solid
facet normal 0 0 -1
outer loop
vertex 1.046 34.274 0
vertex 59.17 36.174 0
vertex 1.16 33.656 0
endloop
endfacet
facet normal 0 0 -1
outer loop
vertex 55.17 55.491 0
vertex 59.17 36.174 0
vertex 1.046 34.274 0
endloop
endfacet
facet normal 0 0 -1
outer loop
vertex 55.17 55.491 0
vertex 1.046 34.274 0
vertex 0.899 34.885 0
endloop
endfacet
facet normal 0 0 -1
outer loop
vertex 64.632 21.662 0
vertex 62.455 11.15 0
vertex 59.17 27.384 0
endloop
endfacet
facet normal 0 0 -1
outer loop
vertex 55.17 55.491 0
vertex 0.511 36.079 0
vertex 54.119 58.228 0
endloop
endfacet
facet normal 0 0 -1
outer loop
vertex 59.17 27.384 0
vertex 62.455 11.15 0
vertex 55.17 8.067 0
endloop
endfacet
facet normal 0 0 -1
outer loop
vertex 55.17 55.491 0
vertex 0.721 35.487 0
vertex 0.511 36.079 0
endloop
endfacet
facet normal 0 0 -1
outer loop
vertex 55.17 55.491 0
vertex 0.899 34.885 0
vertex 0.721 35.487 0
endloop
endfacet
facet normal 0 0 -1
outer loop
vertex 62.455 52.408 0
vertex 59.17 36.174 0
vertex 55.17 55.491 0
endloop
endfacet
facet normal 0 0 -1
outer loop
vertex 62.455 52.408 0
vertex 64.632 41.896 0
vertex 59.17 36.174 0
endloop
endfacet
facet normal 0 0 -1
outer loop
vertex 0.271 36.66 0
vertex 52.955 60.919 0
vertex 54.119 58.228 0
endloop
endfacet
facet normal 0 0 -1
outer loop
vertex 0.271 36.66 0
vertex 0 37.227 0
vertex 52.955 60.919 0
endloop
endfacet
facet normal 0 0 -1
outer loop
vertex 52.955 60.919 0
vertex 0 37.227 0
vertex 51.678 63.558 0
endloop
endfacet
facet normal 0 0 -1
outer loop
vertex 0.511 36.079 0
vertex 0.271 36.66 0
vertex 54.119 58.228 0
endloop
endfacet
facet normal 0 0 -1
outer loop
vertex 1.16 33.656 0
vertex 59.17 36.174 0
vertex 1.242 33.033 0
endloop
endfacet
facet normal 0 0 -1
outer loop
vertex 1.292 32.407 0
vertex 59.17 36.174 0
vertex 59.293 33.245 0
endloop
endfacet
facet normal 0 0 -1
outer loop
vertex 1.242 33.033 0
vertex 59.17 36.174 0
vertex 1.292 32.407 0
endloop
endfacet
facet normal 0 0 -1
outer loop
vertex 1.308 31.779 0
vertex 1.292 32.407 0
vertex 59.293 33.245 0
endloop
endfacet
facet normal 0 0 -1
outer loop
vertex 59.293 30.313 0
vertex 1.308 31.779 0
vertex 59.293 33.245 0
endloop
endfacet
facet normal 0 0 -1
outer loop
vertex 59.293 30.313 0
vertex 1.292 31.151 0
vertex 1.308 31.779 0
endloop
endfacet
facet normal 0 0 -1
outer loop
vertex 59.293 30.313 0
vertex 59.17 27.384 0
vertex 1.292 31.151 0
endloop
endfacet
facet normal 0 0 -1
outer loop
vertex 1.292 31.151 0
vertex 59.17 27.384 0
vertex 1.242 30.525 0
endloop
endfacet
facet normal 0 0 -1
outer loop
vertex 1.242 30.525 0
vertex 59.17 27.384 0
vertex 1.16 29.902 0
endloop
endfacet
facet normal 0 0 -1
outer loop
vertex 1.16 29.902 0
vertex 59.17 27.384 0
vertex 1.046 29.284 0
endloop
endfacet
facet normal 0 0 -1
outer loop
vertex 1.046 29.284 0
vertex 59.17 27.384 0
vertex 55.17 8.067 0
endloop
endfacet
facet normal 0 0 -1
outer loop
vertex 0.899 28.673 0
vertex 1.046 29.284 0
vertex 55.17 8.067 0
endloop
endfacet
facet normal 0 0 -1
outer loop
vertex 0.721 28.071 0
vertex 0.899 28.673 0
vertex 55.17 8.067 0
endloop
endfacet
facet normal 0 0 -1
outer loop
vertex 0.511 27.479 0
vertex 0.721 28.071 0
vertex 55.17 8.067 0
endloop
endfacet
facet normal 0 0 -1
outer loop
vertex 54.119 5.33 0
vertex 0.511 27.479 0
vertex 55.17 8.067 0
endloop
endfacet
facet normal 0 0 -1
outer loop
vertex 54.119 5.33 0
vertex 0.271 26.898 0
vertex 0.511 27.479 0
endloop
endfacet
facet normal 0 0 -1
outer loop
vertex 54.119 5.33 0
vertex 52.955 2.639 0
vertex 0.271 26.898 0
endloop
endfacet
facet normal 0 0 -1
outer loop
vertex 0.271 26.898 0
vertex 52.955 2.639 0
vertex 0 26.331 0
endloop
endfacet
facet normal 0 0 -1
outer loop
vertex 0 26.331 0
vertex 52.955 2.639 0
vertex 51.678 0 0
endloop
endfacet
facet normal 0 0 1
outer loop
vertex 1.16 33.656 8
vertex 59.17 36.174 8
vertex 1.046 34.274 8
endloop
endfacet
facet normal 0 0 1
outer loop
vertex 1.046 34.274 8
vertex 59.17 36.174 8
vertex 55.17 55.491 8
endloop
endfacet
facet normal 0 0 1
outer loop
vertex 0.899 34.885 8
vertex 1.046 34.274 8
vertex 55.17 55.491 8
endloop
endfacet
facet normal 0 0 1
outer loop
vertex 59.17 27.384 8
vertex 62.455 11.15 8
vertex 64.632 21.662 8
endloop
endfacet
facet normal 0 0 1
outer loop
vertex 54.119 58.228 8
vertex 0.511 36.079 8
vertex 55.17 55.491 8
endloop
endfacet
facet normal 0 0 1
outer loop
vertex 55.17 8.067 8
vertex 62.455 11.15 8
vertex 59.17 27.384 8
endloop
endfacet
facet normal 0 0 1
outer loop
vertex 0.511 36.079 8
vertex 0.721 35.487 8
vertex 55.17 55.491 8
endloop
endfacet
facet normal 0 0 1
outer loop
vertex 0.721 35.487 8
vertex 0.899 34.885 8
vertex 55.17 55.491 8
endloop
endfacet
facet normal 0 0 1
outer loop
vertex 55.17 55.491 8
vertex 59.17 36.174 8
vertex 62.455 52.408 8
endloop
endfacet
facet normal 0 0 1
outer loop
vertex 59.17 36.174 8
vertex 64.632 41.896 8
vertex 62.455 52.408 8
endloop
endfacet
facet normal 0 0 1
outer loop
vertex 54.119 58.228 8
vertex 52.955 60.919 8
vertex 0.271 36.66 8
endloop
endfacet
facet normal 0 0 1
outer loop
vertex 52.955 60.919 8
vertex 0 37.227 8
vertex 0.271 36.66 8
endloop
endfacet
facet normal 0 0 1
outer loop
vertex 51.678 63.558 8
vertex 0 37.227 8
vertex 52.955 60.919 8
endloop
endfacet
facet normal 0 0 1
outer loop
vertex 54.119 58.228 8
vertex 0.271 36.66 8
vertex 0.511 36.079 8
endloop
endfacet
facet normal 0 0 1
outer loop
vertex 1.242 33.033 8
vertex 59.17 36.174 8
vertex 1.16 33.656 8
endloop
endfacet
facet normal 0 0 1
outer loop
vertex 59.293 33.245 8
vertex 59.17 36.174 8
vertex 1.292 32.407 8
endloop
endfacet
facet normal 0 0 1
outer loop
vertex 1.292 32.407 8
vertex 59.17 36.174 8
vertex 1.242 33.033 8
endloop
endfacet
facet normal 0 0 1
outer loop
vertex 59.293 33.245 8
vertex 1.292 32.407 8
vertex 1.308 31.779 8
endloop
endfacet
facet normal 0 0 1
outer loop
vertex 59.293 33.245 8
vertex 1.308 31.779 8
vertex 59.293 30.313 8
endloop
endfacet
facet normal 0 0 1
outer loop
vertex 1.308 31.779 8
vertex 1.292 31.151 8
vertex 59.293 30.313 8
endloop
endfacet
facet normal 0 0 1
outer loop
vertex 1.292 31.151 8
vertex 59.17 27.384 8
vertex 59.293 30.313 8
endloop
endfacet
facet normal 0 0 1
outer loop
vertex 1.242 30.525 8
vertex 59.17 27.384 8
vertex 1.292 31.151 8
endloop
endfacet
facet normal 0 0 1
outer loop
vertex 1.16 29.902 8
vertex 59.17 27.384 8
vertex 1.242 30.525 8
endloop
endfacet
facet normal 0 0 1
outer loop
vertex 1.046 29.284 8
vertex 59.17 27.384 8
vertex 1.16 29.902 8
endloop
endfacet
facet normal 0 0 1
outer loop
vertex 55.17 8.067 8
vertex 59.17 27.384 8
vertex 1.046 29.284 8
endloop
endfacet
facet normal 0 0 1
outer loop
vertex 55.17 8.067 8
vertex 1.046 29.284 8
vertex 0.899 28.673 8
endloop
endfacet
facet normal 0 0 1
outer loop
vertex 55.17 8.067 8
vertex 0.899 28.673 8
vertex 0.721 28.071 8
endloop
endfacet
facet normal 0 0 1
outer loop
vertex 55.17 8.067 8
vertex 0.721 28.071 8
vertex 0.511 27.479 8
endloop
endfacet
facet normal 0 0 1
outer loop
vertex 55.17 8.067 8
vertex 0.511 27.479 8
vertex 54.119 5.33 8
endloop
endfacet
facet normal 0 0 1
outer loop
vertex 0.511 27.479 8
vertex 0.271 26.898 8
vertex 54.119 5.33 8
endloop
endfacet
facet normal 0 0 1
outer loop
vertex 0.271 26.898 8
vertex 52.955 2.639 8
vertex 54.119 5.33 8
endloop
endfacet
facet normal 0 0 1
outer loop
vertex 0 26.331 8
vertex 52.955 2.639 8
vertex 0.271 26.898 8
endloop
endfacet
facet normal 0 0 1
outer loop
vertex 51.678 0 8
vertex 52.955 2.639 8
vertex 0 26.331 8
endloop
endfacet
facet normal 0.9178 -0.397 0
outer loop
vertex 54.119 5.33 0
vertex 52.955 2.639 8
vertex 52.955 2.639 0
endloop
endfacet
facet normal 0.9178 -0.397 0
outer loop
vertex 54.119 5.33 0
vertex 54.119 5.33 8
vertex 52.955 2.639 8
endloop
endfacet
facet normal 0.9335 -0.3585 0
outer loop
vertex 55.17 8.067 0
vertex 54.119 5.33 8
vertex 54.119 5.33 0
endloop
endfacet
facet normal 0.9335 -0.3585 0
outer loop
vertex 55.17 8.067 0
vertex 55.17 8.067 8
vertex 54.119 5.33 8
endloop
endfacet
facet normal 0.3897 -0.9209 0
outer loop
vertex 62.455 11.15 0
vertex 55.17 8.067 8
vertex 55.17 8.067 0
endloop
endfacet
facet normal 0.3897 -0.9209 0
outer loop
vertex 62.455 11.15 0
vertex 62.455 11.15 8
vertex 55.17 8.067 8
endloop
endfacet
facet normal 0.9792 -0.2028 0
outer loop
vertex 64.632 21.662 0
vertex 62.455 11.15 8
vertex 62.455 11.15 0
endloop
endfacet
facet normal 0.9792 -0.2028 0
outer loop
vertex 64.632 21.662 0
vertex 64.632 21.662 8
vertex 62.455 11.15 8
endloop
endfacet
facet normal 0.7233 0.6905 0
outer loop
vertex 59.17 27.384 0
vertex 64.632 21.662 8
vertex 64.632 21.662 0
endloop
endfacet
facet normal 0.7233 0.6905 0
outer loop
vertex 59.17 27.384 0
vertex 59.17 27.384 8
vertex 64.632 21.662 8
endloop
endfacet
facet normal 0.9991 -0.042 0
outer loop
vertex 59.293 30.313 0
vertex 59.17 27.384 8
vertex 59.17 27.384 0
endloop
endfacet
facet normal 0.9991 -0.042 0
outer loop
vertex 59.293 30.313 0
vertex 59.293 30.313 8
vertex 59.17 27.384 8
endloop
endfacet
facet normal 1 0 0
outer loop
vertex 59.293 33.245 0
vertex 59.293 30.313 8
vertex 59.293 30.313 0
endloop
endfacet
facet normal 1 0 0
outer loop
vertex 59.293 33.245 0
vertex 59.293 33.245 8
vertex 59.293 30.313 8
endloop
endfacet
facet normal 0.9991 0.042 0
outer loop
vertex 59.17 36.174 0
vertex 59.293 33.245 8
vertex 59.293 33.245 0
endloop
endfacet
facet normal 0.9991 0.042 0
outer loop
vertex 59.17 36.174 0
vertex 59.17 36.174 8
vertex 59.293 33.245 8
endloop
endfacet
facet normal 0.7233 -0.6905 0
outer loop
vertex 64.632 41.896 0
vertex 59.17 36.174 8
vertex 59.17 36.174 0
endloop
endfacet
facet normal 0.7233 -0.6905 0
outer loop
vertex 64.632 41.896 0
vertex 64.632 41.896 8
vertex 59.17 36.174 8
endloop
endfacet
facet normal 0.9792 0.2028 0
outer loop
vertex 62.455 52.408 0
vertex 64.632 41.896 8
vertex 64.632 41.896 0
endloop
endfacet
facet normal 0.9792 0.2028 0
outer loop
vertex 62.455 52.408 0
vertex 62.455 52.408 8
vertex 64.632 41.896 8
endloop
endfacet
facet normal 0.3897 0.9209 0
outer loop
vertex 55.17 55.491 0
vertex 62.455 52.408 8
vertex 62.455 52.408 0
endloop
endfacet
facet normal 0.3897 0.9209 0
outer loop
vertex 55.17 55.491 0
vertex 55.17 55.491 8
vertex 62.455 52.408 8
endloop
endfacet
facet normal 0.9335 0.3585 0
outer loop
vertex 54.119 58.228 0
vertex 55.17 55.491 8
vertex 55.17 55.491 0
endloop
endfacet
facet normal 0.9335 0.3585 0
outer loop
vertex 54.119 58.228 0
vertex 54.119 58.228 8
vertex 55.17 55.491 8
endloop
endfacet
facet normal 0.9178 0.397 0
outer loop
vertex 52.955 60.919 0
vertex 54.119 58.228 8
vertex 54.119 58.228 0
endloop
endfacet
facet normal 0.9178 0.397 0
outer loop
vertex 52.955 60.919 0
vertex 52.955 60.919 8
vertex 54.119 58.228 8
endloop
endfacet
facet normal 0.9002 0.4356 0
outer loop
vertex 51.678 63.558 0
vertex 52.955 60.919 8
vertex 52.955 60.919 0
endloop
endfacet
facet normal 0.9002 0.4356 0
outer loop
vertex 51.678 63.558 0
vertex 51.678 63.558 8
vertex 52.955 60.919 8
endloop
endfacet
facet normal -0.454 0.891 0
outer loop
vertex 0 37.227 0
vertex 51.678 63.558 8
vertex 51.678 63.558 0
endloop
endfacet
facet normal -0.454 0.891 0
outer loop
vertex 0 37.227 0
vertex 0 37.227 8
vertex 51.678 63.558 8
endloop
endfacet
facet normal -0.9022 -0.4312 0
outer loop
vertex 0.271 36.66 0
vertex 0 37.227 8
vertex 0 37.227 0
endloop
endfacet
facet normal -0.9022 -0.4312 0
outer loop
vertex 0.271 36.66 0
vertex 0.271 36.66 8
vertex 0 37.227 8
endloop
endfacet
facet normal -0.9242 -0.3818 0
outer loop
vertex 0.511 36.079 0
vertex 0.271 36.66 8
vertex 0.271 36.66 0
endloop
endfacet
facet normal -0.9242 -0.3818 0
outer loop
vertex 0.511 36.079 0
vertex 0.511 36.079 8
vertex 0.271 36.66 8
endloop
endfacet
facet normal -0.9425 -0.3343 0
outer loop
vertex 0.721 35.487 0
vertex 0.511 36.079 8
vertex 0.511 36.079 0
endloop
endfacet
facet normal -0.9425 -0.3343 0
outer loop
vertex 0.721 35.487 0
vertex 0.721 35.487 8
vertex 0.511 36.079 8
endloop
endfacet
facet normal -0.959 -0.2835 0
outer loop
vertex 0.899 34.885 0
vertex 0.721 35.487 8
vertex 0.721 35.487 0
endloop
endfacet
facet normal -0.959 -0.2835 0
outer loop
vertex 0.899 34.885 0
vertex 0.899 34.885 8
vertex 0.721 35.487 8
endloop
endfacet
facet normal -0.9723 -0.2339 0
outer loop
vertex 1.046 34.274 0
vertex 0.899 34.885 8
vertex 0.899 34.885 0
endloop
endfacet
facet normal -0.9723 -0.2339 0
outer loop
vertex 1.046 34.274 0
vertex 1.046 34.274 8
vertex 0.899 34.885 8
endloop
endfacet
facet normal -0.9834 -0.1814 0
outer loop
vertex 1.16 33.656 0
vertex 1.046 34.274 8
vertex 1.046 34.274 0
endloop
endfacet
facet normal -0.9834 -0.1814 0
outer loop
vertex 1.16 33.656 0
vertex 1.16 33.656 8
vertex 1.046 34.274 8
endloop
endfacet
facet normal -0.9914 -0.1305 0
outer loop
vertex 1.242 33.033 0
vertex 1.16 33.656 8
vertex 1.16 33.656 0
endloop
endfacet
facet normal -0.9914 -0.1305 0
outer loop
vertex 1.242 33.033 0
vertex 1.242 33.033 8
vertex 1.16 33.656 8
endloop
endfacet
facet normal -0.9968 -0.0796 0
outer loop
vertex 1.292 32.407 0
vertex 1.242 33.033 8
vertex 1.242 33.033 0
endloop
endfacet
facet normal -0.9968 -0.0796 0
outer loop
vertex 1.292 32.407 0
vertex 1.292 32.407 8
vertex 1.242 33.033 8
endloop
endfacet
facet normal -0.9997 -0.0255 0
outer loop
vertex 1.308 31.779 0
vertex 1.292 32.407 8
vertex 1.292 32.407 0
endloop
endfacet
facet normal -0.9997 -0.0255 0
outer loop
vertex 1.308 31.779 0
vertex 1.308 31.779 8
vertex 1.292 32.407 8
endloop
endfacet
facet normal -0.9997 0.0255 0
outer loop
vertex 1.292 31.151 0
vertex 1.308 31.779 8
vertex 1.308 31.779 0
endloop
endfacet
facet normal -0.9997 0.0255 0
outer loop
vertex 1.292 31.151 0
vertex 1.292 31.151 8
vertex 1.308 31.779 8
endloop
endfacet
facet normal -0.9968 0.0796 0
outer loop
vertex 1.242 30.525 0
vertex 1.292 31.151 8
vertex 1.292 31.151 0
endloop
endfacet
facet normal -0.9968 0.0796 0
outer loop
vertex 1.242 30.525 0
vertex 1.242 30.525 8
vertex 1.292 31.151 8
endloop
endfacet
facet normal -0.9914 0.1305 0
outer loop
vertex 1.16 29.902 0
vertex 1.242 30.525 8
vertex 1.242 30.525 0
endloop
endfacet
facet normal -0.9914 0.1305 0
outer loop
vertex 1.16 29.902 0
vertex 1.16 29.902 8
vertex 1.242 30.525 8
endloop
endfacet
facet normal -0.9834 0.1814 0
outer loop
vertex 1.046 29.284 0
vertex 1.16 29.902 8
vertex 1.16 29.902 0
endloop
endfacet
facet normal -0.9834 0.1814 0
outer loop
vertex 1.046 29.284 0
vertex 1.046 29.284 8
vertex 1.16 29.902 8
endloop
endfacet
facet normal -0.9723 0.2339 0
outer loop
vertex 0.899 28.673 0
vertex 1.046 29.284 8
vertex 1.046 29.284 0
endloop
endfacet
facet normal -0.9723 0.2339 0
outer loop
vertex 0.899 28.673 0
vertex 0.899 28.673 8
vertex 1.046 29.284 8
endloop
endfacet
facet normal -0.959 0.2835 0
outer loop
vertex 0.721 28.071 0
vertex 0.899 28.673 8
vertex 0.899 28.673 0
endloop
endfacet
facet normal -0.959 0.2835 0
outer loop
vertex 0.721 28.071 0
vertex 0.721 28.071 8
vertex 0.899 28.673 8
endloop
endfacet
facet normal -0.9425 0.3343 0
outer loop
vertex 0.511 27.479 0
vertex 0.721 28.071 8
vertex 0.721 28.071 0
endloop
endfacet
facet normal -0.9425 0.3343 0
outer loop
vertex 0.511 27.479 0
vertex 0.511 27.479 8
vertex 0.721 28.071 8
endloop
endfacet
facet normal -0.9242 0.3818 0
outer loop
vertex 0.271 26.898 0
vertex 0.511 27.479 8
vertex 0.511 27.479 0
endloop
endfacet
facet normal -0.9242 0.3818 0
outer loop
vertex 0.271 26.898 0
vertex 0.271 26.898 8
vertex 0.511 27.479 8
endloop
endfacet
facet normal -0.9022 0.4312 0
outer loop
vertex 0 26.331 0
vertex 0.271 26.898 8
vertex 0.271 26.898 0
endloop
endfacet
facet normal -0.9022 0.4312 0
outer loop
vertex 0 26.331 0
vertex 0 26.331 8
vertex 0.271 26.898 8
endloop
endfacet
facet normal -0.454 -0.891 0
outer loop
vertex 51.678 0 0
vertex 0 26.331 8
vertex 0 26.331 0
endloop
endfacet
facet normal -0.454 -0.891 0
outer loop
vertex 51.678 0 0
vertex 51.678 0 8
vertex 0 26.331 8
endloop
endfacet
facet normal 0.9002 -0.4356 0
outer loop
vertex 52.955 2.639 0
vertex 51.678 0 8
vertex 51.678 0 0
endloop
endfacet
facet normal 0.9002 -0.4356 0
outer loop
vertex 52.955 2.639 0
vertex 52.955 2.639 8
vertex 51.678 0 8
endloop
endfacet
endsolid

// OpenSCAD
$fn = 32;

// ----------------------------------------------------------------------
// Gear sector: 2 teeth on 54 degrees
// ----------------------------------------------------------------------

// --- parameters (mm) ---
sector_angle = 54;        // sector angle, degrees
root_r = 70;              // root circle radius
tooth_h = 6;              // tooth height over the root circle
teeth = 2;                // number of teeth on the sector
hub_r = 12;               // hub bore radius
plate_t = 8;              // sector thickness, Z
arc_step = 3;             // sampling step of the root/hub arcs, degrees
fit_tol = 0.02;           // declared fit tolerance (prompt contract)
free_tol = 0.2;           // declared free tolerance (prompt contract)

tip_r = root_r + tooth_h;  // tip circle radius

profile = [[51.678, 0], [52.955, 2.639], [54.119, 5.33], [55.17, 8.067], [62.455, 11.15], [64.632, 21.662], [59.17, 27.384], [59.293, 30.313], [59.293, 33.245], [59.17, 36.174], [64.632, 41.896], [62.455, 52.408], [55.17, 55.491], [54.119, 58.228], [52.955, 60.919], [51.678, 63.558], [0, 37.227], [0.271, 36.66], [0.511, 36.079], [0.721, 35.487], [0.899, 34.885], [1.046, 34.274], [1.16, 33.656], [1.242, 33.033], [1.292, 32.407], [1.308, 31.779], [1.292, 31.151], [1.242, 30.525], [1.16, 29.902], [1.046, 29.284], [0.899, 28.673], [0.721, 28.071], [0.511, 27.479], [0.271, 26.898], [0, 26.331]];  // primary outline, 35 points, counter clockwise

// --- the one profile operation ---
linear_extrude(height = plate_t) polygon(points = profile);
